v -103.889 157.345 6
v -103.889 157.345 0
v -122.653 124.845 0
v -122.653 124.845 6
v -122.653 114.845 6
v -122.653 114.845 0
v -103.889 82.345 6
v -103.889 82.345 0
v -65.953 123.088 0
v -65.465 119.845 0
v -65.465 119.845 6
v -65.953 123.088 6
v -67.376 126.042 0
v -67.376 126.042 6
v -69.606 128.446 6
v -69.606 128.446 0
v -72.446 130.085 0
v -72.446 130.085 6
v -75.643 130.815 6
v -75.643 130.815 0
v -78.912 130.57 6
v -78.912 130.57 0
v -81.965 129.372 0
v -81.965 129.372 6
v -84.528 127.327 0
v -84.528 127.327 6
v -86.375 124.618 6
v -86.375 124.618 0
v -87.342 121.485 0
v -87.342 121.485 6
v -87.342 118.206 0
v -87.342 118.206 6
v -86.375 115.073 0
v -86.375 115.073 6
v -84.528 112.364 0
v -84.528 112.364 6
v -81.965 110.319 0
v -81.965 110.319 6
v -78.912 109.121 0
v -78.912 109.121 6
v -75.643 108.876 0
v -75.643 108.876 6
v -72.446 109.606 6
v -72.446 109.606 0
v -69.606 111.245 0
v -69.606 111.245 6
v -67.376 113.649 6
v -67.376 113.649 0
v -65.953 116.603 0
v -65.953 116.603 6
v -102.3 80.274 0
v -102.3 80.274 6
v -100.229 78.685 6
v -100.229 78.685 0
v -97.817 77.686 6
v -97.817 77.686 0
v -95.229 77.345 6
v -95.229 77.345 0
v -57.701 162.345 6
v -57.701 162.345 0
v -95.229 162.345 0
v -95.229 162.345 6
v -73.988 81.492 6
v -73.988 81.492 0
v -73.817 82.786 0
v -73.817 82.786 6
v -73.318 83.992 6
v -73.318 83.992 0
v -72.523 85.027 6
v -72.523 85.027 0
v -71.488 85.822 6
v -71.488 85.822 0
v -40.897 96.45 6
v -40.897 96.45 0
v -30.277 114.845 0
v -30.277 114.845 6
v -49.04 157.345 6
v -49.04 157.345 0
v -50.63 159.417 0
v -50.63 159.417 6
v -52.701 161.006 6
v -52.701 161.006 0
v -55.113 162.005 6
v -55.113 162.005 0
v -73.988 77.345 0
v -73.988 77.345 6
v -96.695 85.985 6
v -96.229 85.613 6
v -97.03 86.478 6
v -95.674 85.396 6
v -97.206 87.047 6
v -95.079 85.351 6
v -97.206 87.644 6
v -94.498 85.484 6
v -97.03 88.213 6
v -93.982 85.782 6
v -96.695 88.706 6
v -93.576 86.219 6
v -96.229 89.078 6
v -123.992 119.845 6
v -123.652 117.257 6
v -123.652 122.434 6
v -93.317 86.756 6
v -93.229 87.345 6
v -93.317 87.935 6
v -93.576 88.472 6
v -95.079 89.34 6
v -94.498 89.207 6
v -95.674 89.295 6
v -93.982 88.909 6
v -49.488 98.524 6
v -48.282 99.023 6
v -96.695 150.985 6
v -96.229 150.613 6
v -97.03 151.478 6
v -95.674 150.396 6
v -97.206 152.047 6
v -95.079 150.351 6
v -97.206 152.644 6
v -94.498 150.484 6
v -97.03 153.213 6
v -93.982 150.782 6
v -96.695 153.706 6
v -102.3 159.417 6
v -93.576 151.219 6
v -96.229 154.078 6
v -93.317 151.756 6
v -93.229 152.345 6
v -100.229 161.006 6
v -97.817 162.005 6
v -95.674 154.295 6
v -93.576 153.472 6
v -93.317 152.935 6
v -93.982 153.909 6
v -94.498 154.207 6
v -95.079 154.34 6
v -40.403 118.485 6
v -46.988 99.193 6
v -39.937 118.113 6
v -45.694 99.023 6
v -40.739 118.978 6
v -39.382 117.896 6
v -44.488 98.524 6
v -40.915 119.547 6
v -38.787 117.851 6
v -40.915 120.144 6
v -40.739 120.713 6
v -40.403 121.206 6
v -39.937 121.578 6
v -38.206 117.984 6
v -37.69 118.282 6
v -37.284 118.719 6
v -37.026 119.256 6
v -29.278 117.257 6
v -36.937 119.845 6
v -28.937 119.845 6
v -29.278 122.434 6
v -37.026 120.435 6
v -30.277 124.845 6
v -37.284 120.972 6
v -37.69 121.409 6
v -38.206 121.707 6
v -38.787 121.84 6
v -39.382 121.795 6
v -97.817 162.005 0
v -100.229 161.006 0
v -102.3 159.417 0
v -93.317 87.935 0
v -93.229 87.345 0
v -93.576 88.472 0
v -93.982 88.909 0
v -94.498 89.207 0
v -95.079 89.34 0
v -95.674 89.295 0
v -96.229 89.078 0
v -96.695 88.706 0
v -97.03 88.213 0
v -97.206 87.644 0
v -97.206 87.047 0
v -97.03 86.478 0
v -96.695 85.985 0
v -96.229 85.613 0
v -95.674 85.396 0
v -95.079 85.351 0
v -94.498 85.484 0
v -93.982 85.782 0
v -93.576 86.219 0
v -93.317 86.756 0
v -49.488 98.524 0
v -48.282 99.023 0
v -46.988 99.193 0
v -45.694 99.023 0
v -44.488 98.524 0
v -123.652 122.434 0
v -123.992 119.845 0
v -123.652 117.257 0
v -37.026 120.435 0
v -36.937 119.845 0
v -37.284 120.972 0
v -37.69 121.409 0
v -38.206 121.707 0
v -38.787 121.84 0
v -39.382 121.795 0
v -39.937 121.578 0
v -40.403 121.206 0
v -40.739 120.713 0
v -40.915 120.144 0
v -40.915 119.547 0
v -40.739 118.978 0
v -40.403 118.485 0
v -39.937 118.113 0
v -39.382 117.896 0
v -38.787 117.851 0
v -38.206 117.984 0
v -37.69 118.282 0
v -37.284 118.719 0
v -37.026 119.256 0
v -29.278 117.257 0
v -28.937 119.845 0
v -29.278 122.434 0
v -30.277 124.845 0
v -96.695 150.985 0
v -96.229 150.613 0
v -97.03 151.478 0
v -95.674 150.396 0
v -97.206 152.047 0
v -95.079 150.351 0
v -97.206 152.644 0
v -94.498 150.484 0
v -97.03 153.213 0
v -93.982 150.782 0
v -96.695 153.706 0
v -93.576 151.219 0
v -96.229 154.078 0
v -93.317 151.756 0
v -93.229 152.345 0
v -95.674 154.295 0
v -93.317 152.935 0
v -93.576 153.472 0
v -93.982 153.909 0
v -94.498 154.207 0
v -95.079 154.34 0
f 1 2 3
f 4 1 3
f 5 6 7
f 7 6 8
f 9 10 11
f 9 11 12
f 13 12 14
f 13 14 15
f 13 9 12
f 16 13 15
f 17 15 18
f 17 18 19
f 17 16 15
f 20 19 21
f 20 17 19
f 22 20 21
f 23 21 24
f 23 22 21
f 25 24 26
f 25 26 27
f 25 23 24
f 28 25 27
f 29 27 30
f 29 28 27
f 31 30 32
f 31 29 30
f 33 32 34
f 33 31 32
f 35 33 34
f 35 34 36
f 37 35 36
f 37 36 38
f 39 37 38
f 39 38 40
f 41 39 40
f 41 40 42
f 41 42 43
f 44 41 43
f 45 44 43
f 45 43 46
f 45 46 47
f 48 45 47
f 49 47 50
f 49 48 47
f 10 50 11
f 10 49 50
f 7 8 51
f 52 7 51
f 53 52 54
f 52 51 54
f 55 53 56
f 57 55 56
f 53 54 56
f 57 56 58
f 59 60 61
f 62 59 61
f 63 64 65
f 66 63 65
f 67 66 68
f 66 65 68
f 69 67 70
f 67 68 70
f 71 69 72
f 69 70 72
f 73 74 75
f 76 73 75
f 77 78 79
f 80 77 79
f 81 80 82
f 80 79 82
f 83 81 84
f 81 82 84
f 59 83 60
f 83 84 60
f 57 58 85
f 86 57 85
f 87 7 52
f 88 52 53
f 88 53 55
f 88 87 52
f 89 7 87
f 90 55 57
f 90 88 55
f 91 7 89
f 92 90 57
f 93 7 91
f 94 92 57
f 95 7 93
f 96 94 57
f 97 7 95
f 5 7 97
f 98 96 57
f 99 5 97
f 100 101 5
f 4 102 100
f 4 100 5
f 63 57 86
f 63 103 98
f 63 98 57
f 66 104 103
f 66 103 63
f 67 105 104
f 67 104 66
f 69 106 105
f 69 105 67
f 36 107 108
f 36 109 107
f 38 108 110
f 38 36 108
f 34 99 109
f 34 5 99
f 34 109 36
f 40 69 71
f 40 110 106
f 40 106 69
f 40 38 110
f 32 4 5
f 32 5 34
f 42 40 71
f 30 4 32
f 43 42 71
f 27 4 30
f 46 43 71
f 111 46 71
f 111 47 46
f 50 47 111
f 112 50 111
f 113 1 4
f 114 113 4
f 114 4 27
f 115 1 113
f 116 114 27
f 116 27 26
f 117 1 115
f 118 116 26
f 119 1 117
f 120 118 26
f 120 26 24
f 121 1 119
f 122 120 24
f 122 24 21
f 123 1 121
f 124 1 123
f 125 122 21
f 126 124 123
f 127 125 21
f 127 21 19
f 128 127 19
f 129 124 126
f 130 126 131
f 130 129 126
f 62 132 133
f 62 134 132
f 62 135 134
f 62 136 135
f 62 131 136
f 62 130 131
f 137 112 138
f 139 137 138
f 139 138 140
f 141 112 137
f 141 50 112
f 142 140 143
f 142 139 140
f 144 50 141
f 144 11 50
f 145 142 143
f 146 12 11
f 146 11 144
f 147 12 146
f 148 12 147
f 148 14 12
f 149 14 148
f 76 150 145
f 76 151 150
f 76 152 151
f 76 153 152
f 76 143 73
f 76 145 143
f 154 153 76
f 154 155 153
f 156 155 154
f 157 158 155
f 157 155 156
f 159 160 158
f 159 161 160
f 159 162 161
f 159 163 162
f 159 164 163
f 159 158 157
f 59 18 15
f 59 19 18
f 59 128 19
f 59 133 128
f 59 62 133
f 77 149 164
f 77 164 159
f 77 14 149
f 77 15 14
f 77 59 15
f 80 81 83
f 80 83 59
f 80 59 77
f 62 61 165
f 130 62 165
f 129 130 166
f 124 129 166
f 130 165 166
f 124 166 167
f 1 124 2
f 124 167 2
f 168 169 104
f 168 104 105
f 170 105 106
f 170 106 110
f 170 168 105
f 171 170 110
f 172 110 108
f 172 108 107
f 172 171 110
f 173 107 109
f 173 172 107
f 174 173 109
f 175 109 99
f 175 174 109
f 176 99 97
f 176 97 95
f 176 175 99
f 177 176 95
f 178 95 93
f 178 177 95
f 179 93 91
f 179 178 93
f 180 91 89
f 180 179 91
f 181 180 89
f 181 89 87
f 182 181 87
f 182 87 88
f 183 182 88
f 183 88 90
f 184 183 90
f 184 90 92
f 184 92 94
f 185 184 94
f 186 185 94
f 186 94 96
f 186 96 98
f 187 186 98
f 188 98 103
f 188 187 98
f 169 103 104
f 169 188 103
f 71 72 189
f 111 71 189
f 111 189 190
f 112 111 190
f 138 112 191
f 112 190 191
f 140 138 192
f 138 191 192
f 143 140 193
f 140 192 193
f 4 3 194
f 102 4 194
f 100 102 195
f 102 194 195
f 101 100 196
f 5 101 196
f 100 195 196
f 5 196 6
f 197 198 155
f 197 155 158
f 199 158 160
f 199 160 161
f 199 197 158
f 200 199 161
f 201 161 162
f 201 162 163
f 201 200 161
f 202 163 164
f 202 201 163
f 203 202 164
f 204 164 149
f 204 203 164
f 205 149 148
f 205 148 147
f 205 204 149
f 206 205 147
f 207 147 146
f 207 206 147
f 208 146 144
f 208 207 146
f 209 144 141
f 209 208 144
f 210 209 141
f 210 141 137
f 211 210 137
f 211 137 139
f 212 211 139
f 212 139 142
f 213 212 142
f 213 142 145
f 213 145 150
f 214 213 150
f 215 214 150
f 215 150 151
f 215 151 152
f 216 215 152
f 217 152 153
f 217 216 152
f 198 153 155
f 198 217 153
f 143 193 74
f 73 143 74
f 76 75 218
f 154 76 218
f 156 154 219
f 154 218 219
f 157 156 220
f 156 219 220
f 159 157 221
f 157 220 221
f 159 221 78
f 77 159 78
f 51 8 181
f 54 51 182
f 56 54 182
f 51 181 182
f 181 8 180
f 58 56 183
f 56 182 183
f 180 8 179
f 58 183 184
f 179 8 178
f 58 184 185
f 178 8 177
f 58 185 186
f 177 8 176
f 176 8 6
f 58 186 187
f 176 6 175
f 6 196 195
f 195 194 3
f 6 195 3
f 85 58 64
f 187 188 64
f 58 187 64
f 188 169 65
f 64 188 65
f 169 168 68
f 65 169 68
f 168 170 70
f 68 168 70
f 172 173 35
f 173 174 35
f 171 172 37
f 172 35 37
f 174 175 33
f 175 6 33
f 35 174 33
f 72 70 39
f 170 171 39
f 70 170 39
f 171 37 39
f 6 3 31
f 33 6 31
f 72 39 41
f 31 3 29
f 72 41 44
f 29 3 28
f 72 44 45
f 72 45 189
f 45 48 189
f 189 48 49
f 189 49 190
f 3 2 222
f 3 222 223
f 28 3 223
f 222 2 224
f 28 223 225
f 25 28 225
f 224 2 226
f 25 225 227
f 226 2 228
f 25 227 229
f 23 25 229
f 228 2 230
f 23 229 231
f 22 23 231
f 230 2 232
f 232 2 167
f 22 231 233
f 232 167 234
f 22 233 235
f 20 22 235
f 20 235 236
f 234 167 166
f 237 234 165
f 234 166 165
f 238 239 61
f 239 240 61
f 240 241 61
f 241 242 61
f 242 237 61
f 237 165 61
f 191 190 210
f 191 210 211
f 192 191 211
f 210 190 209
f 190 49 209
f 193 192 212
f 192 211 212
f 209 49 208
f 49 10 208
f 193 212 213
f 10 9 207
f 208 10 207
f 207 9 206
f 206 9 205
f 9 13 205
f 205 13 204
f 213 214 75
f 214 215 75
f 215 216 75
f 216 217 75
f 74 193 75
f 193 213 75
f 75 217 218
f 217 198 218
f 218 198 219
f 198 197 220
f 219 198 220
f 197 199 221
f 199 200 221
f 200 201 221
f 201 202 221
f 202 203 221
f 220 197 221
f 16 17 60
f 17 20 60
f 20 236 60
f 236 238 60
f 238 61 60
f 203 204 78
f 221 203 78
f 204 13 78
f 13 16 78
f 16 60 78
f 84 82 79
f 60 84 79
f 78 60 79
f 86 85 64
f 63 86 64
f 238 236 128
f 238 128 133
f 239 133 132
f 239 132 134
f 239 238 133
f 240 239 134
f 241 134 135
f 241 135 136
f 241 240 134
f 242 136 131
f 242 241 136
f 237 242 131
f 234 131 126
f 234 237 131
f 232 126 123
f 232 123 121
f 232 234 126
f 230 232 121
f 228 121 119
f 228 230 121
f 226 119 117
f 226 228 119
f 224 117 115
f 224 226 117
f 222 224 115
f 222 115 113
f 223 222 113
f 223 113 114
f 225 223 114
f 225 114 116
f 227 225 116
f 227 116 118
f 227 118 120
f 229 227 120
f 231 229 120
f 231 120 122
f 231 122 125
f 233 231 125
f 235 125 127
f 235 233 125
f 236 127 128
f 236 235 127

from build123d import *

# Parameters (mm, degrees)
SKETCH1_R           = 1.999999997
SKETCH1_R_2         = 10.999999998
SKETCH1_R_3         = 1.999999998
BOSS_EXTRUDE1_DEPTH = 6


with BuildPart() as part:
    # Sketch1 → Boss-Extrude1 (new body)
    with BuildSketch(Plane.XY):
        with BuildLine():
            Line((-57.700744027, 162.345498824), (-95.228511524, 162.345498823))
            ThreePointArc((-95.228511524, 162.345498823), (-100.228511524, 161.005752861), (-103.888765562, 157.345498823))
            Line((-103.888765562, 157.345498823), (-122.65264931, 124.845498823))
            ThreePointArc((-122.65264931, 124.845498823), (-123.992395272, 119.845498822), (-122.65264931, 114.845498822))
            Line((-122.65264931, 114.845498822), (-103.88876556, 82.345498823))
            ThreePointArc((-103.88876556, 82.345498823), (-100.228511522, 78.685244785), (-95.228511522, 77.345498823))
            Line((-95.228511522, 77.345498823), (-73.987721784, 77.345498823))
            Line((-73.987721784, 77.345498823), (-73.987721784, 81.491705925))
            ThreePointArc((-73.987721784, 81.491705925), (-73.317848803, 83.991705925), (-71.487721784, 85.821832944))
            Line((-71.487721784, 85.821832944), (-49.487721784, 98.523538865))
            ThreePointArc((-49.487721784, 98.523538865), (-46.987721783, 99.193411846), (-44.487721784, 98.523538865))
            Line((-44.487721784, 98.523538865), (-40.897001108, 96.450435316))
            Line((-40.897001108, 96.450435316), (-30.276606238, 114.845498825))
            ThreePointArc((-30.276606238, 114.845498825), (-28.936860276, 119.845498825), (-30.276606239, 124.845498826))
            Line((-30.276606239, 124.845498826), (-49.040489989, 157.345498825))
            ThreePointArc((-49.040489989, 157.345498825), (-52.700744027, 161.005752862), (-57.700744027, 162.345498824))
        make_face()
        with Locations((-38.936860277, 119.845498824)):
            Circle(SKETCH1_R, mode=Mode.SUBTRACT)
        with Locations((-95.228511522, 87.345498823)):
            Circle(SKETCH1_R, mode=Mode.SUBTRACT)
        with Locations((-76.464627774, 119.845498824)):
            Circle(SKETCH1_R_2, mode=Mode.SUBTRACT)
        with Locations((-95.228511523, 152.345498823)):
            Circle(SKETCH1_R_3, mode=Mode.SUBTRACT)
    extrude(amount=BOSS_EXTRUDE1_DEPTH)


solid = part.part
